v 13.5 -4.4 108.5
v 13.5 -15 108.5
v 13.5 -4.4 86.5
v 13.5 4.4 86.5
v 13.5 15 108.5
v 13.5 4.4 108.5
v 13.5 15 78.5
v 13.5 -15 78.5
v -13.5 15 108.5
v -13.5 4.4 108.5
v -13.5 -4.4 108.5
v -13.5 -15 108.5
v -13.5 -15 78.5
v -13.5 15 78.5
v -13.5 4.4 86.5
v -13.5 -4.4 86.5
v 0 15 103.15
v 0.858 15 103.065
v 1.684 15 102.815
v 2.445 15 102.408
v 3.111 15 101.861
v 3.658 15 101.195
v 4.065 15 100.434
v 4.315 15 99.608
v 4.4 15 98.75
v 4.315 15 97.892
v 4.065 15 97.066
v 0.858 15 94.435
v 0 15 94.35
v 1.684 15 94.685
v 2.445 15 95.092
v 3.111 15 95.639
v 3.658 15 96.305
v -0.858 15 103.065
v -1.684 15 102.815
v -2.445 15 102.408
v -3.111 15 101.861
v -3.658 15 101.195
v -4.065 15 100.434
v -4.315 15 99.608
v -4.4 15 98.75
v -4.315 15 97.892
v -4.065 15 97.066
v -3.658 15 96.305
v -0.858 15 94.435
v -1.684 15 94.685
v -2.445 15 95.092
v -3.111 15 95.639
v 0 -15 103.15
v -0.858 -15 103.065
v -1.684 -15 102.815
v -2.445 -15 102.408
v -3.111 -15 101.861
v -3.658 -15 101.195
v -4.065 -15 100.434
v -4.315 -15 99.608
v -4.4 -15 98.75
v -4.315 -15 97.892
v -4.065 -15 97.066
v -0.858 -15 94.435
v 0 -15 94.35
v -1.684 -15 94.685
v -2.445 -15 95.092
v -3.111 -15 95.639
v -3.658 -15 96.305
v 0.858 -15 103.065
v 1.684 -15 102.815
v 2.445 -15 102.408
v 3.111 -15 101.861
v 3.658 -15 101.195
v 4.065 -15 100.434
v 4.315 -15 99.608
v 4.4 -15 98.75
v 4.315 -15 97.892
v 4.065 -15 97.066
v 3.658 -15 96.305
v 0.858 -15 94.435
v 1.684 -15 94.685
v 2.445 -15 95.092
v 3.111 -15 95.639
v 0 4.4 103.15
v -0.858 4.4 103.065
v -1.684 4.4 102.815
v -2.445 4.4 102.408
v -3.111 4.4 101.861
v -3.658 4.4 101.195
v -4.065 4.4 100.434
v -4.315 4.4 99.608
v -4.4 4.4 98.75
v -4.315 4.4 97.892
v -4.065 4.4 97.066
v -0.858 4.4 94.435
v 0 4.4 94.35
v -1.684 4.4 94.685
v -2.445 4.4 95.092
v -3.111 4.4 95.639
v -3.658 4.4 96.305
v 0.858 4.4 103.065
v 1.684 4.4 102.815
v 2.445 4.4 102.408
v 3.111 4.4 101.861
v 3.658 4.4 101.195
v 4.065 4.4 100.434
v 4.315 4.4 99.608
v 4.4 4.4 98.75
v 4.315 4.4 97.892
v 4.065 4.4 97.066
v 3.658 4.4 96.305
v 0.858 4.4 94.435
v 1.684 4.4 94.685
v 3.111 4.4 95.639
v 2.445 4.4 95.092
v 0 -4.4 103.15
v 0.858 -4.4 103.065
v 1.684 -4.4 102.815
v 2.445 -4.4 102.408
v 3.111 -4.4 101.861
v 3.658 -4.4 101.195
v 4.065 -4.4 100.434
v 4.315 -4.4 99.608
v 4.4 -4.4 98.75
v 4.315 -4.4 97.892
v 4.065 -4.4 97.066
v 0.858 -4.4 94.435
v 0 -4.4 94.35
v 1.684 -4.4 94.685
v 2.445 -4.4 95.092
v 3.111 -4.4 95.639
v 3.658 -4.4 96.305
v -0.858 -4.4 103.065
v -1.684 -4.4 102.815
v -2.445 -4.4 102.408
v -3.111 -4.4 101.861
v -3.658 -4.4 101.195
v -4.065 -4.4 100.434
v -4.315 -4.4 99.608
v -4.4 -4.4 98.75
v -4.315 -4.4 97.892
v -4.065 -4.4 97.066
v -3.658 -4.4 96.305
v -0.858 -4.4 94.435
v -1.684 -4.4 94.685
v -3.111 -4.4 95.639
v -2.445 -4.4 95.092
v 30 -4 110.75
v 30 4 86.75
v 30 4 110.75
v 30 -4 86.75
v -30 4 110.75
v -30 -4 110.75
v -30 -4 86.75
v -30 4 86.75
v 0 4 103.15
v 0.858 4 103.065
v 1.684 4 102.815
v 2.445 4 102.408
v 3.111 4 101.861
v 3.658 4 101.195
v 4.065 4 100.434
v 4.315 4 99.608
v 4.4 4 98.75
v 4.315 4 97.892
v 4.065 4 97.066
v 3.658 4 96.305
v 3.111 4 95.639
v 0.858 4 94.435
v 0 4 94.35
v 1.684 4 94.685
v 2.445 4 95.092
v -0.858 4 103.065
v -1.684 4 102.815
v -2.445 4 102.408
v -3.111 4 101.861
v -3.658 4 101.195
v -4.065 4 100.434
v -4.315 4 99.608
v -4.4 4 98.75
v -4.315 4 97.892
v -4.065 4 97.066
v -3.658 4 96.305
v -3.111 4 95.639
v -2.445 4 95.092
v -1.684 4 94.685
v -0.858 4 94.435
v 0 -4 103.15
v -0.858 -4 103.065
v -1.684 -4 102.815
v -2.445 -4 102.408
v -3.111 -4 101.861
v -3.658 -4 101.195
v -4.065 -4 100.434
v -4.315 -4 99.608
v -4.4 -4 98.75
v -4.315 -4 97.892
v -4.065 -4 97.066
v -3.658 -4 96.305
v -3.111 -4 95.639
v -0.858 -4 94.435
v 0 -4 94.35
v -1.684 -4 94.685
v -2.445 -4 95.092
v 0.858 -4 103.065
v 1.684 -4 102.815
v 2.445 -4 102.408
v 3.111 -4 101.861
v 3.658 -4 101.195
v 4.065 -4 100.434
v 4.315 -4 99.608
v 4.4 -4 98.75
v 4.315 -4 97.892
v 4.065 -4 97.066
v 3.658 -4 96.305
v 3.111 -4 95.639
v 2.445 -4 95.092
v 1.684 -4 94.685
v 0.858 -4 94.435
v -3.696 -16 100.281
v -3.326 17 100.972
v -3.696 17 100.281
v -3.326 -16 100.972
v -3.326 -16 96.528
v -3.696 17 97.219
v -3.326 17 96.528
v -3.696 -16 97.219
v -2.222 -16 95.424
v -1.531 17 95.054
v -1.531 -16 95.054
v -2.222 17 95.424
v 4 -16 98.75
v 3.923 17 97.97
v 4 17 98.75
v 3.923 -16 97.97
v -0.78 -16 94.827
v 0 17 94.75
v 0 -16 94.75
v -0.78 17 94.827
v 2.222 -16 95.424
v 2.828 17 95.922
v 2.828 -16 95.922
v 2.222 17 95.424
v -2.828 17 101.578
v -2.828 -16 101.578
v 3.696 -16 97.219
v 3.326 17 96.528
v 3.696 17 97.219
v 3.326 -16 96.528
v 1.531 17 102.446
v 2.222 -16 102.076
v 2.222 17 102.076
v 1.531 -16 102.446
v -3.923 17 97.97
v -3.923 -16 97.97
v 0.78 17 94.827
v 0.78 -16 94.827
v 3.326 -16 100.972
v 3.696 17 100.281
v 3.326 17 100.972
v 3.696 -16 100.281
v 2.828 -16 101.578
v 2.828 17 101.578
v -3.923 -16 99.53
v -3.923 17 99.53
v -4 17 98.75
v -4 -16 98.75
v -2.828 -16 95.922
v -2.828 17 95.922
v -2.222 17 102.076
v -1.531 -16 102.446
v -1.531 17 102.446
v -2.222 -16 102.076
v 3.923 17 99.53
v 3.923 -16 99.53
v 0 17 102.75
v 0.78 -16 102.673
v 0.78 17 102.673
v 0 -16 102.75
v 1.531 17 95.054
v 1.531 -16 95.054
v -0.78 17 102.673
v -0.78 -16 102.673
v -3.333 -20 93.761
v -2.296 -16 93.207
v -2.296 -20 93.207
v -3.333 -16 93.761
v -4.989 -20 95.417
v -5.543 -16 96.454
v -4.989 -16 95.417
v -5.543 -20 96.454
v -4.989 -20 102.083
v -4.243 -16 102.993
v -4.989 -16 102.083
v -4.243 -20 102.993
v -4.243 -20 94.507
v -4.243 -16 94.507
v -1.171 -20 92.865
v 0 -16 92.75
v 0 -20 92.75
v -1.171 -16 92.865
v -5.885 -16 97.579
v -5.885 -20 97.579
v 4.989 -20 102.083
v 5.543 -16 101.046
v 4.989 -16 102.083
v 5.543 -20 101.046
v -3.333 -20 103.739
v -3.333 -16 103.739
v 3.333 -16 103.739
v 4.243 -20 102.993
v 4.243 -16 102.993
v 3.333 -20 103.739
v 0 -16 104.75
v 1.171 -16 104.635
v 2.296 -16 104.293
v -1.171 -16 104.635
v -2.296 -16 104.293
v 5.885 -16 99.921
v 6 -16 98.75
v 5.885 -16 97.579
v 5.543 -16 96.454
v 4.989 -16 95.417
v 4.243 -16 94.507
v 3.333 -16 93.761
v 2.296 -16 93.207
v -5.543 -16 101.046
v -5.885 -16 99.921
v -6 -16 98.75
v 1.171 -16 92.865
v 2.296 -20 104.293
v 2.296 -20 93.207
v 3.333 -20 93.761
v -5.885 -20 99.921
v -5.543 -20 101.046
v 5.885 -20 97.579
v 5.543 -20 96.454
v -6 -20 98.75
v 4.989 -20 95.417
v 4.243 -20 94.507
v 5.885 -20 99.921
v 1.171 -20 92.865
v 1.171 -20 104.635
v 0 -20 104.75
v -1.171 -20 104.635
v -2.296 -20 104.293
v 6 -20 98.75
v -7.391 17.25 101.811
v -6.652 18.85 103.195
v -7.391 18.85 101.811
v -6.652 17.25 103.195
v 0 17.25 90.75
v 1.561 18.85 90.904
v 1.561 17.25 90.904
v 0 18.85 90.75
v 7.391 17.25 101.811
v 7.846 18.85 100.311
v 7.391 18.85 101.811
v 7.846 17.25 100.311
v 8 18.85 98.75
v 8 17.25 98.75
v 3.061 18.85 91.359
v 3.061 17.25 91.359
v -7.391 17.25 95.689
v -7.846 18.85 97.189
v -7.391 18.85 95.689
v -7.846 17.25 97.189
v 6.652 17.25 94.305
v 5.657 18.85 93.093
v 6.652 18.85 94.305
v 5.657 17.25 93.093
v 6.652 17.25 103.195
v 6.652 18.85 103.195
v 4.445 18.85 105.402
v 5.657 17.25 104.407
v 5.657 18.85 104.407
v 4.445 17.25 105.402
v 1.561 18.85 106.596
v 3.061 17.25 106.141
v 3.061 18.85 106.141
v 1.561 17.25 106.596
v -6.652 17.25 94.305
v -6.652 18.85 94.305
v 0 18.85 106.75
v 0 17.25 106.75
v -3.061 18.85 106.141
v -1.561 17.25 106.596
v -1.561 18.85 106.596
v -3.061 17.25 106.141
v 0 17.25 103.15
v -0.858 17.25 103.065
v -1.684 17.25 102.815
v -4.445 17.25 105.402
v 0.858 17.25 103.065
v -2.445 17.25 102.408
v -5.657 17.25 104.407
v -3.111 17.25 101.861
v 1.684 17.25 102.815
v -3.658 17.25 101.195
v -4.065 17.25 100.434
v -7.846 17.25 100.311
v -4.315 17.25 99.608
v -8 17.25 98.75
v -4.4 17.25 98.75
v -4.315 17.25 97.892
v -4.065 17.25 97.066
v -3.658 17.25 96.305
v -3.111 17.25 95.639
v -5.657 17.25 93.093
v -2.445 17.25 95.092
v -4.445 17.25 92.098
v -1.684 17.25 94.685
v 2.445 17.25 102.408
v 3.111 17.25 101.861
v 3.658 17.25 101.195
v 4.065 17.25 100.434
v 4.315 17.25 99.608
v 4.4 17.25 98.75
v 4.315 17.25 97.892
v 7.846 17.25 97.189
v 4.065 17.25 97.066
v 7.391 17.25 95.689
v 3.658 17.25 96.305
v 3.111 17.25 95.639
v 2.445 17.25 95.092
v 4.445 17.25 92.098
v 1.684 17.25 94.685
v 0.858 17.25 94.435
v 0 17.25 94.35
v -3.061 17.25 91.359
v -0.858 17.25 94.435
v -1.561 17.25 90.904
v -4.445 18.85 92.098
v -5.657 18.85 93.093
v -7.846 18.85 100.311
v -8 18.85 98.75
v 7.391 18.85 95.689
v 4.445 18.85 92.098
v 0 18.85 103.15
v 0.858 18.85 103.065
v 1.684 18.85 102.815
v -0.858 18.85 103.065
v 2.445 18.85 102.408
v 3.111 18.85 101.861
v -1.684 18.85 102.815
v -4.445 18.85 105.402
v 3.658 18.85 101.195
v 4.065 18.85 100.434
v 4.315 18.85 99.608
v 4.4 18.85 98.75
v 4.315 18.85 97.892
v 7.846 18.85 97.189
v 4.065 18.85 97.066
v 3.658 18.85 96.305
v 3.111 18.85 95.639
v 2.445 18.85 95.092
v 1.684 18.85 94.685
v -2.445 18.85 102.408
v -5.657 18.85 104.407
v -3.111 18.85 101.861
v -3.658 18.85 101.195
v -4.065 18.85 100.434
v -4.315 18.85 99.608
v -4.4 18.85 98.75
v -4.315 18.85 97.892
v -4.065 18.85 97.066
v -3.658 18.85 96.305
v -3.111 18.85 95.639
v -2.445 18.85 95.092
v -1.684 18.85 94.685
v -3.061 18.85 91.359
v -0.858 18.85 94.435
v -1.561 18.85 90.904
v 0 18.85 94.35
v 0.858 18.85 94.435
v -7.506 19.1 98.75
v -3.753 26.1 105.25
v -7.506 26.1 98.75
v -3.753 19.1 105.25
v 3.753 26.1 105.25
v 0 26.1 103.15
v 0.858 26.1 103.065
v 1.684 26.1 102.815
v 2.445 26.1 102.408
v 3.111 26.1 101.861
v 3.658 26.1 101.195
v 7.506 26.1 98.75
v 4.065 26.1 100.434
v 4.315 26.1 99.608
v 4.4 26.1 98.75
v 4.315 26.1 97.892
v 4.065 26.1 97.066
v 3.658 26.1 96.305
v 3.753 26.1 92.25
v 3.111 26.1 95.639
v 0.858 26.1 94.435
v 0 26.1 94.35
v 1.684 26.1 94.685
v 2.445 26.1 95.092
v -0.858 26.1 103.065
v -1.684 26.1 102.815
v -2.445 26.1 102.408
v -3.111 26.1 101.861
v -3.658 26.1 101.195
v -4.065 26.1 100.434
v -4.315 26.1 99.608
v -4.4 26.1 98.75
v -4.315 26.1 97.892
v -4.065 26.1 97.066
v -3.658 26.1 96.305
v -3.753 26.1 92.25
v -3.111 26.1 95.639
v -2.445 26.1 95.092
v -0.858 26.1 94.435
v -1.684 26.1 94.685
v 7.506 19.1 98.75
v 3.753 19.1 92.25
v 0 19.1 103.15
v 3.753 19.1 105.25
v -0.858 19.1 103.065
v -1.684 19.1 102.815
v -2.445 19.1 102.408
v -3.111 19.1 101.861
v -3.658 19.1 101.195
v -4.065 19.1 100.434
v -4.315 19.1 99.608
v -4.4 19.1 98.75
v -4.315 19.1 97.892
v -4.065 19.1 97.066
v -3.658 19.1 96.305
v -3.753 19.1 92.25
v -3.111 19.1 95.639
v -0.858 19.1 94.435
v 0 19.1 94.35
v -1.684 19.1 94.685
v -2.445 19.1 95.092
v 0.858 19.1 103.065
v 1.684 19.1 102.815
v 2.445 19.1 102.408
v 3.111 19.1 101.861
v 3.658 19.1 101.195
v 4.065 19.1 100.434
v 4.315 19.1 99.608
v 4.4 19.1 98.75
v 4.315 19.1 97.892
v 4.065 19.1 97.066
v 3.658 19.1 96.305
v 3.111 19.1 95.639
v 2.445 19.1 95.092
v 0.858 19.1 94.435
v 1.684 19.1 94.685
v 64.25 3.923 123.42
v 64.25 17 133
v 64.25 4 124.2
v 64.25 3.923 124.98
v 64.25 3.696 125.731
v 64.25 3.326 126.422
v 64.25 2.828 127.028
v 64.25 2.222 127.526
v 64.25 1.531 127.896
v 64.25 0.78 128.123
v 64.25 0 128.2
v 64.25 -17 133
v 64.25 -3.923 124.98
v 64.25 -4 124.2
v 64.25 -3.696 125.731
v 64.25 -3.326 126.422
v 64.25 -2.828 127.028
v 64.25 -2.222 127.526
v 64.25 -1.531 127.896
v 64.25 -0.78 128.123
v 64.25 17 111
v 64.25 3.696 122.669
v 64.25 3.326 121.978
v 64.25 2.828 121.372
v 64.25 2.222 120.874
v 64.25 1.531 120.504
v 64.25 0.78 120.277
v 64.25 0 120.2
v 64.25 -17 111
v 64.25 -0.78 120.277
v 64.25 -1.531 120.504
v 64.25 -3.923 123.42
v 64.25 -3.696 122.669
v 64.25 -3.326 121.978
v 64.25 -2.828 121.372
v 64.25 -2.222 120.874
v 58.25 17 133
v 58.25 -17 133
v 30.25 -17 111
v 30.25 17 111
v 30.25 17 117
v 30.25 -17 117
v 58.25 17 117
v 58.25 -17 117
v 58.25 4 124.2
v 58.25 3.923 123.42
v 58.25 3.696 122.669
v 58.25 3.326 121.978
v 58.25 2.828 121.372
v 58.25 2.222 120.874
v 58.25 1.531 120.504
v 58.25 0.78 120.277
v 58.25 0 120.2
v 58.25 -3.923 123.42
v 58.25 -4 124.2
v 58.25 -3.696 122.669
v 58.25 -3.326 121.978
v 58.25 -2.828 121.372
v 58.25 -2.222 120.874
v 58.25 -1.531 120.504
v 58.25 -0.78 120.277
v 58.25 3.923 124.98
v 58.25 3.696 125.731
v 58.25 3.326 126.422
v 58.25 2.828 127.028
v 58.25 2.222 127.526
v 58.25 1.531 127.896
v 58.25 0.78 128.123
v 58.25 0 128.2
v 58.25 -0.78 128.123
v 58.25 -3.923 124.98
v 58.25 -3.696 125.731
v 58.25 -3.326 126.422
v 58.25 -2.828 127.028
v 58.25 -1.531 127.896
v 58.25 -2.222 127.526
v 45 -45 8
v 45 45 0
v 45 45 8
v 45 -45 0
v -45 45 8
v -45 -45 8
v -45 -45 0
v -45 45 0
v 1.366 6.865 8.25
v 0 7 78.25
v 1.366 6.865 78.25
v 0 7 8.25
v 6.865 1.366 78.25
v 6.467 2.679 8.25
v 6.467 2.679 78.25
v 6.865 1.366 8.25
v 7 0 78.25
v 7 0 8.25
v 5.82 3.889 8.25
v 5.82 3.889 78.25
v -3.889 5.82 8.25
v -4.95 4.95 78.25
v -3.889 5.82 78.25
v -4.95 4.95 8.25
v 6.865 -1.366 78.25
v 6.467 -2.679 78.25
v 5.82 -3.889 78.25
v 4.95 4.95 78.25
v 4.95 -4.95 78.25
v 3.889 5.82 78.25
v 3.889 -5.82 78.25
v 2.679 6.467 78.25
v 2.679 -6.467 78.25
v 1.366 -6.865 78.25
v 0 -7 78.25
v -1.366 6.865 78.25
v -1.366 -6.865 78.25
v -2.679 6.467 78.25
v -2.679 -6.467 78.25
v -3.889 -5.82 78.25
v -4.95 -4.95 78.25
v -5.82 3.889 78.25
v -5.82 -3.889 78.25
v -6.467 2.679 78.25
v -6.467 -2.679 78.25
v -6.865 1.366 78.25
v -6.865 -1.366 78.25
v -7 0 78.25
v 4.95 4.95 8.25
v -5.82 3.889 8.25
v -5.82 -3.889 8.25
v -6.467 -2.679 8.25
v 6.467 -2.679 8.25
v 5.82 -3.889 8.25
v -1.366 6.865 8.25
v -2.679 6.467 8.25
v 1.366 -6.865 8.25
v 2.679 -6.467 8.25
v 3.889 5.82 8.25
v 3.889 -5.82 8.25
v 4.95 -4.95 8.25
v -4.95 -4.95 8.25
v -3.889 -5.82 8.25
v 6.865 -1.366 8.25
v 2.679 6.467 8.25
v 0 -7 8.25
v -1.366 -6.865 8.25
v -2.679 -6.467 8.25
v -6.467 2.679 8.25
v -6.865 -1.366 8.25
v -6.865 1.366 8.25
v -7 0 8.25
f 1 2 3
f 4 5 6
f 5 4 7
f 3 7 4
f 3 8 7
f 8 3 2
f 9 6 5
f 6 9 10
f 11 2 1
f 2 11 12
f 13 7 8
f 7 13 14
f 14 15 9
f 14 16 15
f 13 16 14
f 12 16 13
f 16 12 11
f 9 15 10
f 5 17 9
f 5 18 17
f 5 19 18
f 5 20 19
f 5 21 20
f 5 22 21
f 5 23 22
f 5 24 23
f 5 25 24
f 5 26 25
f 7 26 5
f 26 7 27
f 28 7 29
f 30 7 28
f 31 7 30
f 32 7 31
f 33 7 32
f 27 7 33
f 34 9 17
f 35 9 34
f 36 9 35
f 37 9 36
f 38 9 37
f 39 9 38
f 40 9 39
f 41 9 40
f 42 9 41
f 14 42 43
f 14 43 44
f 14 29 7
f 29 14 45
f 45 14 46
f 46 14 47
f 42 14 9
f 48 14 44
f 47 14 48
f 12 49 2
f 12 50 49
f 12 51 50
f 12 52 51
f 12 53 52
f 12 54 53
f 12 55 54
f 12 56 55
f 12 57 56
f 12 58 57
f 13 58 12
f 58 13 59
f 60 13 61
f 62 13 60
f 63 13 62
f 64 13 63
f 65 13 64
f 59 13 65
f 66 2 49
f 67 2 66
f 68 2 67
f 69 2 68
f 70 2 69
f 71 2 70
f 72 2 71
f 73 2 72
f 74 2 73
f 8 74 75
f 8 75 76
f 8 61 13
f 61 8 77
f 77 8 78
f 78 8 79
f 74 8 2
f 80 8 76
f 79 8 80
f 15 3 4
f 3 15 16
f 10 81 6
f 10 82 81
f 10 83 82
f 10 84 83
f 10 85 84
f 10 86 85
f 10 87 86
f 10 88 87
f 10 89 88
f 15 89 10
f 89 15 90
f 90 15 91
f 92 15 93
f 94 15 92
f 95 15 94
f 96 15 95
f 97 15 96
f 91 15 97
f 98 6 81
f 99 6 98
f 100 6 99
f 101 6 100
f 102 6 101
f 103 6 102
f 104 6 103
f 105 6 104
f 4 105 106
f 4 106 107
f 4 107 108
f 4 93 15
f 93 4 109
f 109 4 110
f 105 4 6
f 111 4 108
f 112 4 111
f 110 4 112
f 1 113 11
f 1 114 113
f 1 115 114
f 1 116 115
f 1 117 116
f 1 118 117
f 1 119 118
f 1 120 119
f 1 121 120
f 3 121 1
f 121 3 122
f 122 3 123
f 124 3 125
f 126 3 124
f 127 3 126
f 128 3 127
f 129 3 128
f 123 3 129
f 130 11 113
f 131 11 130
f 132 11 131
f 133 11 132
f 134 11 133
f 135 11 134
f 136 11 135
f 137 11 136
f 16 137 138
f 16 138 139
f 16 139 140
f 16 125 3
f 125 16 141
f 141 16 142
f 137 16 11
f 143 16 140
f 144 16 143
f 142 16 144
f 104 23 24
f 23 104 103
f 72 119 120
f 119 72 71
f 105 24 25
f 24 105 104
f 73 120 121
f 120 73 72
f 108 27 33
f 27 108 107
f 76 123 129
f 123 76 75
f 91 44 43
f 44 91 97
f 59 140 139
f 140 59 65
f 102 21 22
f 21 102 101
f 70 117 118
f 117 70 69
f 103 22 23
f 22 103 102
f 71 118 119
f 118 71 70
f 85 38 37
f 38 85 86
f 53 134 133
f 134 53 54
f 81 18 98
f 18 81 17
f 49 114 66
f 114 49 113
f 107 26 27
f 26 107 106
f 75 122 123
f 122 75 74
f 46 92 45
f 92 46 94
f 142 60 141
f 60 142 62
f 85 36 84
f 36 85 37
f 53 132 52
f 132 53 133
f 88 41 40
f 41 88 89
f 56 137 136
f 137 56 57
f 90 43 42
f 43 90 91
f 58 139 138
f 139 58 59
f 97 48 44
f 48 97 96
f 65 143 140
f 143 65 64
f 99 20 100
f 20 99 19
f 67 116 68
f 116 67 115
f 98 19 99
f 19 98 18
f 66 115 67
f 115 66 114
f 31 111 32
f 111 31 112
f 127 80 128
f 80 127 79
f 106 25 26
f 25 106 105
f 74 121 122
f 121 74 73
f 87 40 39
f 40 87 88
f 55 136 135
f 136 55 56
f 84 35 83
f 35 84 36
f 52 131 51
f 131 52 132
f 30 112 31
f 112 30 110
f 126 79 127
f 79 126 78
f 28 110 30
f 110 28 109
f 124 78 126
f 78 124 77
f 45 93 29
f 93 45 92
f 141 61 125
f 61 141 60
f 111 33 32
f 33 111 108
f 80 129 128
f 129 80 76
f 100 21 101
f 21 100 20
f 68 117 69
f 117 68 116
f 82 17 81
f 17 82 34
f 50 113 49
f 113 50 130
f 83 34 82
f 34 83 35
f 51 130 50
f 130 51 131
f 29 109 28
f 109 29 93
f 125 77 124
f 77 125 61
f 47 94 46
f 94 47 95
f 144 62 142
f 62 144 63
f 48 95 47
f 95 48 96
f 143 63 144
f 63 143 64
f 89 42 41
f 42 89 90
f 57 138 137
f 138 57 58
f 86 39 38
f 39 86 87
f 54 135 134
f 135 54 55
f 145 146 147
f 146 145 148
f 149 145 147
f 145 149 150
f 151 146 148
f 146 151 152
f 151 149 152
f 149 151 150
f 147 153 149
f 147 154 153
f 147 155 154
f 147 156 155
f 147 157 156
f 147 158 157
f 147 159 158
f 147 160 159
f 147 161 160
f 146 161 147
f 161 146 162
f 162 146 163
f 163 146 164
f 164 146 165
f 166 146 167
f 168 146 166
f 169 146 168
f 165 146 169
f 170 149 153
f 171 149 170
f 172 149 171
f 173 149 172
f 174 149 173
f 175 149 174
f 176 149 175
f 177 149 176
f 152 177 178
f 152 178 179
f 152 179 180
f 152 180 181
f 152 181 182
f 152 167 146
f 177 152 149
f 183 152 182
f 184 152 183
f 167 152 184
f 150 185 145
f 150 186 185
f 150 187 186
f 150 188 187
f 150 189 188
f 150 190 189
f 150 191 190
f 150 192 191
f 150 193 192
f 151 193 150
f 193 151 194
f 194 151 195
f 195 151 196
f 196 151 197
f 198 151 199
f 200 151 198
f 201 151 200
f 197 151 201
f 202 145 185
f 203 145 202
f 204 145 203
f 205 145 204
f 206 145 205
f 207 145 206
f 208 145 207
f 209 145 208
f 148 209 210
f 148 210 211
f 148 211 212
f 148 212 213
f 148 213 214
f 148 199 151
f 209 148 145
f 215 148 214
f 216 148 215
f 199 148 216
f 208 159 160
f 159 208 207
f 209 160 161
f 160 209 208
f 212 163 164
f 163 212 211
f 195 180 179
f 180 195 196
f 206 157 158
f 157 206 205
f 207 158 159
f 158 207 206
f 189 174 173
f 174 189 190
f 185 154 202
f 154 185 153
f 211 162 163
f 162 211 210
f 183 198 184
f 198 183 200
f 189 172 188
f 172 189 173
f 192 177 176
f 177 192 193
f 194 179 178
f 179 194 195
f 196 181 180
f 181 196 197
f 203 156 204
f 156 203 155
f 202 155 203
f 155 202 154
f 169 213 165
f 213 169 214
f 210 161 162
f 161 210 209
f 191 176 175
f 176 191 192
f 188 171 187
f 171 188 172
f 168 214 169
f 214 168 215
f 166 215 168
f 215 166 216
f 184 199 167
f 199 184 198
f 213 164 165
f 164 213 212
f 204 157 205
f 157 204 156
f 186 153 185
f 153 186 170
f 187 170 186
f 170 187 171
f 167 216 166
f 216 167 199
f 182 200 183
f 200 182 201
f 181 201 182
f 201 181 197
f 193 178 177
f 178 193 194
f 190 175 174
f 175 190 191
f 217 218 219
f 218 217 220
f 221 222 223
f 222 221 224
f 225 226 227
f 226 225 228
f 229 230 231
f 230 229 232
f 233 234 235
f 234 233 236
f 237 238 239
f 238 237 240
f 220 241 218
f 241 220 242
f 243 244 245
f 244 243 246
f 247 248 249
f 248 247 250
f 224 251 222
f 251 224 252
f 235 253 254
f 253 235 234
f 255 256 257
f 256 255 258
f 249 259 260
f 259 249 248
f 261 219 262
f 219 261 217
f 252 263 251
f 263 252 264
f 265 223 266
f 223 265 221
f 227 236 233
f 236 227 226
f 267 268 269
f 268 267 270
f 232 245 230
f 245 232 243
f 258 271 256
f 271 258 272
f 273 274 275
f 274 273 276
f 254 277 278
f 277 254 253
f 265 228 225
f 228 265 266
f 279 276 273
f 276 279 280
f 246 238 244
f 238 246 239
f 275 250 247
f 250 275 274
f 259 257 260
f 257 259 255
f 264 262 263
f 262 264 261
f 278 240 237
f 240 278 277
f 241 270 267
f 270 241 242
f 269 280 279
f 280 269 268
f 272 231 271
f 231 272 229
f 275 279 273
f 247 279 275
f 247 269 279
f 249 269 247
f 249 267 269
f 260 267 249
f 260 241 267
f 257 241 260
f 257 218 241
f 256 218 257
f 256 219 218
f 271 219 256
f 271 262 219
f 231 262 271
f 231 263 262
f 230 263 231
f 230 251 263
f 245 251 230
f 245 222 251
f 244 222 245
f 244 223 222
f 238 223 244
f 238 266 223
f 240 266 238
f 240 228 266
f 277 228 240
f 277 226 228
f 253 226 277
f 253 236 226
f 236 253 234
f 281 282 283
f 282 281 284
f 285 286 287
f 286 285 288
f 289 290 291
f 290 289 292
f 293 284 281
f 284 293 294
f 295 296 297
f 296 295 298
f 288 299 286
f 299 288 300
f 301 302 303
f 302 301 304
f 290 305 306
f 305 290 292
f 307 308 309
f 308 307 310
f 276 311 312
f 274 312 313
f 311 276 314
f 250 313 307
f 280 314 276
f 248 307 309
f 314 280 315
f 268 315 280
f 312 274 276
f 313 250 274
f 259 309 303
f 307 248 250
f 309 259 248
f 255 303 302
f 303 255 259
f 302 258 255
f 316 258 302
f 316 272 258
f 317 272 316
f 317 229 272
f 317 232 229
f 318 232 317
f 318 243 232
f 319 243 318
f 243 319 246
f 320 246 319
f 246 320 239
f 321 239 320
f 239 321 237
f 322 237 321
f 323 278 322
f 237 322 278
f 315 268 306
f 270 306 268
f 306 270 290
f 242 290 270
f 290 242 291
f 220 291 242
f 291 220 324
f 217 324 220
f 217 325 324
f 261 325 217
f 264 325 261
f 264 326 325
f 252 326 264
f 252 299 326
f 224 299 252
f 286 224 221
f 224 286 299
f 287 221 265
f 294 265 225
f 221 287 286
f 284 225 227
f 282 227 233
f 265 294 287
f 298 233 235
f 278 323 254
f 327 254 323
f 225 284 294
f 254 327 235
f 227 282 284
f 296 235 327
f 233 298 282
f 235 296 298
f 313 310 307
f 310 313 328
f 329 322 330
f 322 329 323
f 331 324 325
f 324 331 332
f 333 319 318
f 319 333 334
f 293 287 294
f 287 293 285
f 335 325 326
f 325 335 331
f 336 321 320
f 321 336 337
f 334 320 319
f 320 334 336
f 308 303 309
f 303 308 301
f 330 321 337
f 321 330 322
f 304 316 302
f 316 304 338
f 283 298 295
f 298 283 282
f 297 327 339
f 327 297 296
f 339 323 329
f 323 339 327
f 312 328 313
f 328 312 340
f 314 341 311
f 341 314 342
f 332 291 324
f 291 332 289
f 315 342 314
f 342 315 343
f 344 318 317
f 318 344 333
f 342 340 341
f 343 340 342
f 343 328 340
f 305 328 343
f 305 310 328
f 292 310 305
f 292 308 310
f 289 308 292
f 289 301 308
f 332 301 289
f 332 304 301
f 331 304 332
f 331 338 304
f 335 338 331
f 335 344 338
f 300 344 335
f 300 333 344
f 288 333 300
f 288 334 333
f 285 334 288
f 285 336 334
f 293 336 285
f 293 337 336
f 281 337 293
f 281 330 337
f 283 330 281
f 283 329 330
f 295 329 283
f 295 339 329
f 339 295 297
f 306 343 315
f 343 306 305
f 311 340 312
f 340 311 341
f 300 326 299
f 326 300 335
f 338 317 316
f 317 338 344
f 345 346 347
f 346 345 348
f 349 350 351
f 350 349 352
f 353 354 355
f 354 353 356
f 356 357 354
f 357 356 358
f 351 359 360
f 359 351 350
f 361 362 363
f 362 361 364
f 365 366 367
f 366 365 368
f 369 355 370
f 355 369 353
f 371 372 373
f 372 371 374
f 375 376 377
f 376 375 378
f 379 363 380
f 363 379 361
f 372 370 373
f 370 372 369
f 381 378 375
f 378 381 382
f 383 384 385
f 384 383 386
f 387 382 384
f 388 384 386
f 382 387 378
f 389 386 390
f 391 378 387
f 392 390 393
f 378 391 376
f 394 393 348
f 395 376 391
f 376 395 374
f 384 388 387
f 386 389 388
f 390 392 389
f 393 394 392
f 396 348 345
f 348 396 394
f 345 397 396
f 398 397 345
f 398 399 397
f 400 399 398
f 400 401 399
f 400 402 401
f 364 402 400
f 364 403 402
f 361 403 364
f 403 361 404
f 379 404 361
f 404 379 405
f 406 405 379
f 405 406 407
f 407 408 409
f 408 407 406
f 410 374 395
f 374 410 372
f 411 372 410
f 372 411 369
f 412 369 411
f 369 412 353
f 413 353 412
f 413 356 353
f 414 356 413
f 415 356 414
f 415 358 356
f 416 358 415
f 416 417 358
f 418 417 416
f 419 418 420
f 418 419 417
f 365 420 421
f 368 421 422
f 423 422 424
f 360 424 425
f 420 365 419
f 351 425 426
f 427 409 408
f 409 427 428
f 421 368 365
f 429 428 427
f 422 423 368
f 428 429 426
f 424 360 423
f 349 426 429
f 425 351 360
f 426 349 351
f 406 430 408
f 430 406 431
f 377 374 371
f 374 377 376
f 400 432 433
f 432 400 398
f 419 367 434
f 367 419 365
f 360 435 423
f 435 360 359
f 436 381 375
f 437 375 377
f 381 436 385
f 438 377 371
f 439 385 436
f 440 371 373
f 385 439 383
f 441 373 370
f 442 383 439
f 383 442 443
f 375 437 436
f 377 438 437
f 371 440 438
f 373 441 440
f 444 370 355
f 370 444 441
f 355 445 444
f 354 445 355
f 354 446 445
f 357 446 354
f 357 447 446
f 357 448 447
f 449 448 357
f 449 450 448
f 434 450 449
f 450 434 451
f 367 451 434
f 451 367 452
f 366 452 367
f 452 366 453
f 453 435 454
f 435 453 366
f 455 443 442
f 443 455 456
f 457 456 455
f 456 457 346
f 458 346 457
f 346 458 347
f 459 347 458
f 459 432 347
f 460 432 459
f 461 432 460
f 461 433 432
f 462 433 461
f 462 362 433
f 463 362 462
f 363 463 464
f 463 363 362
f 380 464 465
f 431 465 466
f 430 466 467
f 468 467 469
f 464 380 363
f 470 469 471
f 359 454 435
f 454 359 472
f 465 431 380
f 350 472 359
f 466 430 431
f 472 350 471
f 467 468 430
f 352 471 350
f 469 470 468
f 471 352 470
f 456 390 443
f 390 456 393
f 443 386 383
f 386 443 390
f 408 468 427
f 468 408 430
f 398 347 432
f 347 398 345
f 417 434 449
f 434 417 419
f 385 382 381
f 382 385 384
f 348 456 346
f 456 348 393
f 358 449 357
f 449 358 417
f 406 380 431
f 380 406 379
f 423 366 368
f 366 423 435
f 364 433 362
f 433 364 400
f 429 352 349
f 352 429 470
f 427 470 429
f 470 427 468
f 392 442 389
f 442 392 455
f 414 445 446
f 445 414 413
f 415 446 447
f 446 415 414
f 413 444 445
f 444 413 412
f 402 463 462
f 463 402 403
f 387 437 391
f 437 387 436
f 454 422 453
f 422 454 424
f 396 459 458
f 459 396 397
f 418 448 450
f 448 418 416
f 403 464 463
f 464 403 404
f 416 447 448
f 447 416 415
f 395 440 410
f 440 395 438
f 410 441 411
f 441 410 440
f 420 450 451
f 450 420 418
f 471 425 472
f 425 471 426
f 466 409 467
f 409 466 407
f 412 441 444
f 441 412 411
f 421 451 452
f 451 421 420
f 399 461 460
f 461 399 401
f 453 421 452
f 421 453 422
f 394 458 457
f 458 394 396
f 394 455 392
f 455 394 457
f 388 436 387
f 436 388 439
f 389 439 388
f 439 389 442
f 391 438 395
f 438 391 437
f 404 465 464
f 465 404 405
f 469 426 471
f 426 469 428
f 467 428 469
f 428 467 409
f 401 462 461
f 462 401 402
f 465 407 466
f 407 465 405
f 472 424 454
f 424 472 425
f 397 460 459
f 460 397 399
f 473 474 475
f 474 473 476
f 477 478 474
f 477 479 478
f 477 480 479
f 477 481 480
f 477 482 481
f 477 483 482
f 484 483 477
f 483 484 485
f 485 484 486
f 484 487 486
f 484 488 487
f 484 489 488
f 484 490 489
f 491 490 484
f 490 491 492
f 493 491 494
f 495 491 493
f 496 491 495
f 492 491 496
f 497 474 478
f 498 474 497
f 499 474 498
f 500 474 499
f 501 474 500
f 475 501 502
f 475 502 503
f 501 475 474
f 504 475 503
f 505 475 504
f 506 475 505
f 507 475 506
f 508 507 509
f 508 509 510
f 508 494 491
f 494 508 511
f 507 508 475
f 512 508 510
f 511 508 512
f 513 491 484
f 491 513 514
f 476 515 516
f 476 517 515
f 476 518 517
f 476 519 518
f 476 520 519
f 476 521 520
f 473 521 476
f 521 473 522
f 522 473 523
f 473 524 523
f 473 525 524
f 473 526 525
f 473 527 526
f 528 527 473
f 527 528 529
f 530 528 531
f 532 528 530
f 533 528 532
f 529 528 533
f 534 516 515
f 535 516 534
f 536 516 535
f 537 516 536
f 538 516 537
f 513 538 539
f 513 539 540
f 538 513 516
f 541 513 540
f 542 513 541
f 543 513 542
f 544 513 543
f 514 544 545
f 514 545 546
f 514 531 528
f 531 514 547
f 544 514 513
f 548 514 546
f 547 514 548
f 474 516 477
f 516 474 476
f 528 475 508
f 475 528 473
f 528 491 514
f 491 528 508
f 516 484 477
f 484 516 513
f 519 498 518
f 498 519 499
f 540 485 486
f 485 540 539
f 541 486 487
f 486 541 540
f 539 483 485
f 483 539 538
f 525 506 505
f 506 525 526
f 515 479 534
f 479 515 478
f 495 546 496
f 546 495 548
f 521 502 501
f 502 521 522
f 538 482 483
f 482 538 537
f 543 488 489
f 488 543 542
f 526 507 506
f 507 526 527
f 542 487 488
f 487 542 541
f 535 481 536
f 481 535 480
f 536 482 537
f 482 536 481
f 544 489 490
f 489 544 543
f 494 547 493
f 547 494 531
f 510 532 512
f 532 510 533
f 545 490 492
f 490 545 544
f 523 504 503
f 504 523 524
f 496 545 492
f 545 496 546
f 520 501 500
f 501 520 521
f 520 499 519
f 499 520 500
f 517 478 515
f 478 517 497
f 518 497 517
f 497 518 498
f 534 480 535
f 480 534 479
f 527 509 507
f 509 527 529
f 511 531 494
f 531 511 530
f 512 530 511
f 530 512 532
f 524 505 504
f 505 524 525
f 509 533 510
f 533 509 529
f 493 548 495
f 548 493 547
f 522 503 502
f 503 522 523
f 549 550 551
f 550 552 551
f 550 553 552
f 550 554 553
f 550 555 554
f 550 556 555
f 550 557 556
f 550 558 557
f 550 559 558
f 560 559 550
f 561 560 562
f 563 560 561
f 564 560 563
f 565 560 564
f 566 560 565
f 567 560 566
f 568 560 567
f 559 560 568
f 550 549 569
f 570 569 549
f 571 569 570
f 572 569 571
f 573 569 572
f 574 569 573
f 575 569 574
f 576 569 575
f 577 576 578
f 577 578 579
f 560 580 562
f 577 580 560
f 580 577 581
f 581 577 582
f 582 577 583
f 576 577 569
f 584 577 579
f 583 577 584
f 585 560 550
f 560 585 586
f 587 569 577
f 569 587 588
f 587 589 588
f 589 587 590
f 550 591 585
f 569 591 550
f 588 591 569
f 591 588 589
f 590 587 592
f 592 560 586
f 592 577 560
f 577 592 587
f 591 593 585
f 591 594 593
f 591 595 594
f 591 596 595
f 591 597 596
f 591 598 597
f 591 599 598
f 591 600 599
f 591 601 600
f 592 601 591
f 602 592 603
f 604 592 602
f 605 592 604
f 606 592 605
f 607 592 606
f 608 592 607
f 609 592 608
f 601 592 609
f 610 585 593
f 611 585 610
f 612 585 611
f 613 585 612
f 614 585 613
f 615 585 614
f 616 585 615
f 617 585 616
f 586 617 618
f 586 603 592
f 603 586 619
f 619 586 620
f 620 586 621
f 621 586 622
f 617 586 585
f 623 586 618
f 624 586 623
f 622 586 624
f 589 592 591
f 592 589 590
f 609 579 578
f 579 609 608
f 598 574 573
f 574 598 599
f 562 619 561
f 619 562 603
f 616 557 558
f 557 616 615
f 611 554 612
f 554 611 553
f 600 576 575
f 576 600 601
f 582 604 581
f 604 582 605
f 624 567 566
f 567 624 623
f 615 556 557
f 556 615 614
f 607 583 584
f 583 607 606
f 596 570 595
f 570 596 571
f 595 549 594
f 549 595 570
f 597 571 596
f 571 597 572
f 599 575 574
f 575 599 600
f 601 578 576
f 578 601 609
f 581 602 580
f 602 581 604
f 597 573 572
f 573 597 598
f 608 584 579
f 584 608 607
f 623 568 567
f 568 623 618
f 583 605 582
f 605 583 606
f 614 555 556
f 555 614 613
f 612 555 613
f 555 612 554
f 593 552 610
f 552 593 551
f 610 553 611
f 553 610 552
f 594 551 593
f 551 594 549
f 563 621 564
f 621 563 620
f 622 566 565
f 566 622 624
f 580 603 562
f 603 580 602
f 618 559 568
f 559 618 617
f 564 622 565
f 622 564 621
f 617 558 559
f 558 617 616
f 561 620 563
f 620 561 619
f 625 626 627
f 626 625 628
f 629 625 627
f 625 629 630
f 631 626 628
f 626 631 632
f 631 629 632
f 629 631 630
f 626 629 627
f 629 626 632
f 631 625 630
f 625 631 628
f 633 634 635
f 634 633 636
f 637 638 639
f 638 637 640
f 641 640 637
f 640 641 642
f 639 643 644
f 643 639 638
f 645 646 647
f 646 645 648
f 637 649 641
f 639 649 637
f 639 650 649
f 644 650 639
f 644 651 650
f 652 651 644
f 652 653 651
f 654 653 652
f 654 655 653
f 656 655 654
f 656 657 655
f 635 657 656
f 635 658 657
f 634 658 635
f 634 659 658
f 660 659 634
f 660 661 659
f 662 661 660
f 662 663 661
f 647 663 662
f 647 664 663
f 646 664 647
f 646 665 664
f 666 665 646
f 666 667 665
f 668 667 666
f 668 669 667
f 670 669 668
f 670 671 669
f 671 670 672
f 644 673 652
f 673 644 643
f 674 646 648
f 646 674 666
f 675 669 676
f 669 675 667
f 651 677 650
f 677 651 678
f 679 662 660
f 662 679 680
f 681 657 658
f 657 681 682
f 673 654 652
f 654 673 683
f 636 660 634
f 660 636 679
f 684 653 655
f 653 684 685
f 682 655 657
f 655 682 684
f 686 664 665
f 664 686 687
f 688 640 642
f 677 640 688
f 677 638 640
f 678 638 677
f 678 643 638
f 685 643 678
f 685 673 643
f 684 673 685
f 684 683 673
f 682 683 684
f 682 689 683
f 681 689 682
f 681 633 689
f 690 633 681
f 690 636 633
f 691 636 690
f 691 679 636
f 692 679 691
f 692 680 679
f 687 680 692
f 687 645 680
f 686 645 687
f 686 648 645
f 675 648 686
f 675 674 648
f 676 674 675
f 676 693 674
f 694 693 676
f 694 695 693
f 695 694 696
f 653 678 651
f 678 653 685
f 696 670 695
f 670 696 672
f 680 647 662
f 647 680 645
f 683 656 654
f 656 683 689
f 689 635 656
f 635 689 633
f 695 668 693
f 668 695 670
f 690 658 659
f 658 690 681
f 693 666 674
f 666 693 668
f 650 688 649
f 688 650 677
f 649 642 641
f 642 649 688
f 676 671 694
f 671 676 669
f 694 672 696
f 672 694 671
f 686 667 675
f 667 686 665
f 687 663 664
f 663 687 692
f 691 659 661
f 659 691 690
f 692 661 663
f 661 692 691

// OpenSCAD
$fn = 32;

// ------------------------------------------------------------------------
// Lamp arm: column d14 x 70 mm, arm 60 mm
// Every part is its own module, assembly() places every instance.
// ------------------------------------------------------------------------

// --- part 1 ---
module lamp_base() {
  difference() {
    translate([-45, -45, 0]) cube([90, 90, 8]);
  }
}

// --- part 2 ---
module lamp_column() {
  cylinder(h = 70, d = 14);
}

// --- part 3 ---
module head_fork() {
  difference() {
    translate([-13.5, -15, 0]) cube([27, 30, 30]);
    translate([-14.5, -4.4, 8]) cube([29, 8.8, 23]);
    translate([0, 0, 20.25]) rotate([90, 0, 0]) cylinder(h = 32, d = 8.8, center = true);
  }
}

// --- part 4 ---
module lamp_arm() {
  difference() {
    translate([-30, -4, 0]) cube([60, 8, 24]);
    translate([0, 0, 12]) rotate([90, 0, 0]) cylinder(h = 10, d = 8.8, center = true);
  }
}

// --- part 5 ---
module arm_pin() {
  rotate([0, 90, 0]) cylinder(h = 34, d = 8, center = true);
  translate([-20, 0, 0]) rotate([0, 90, 0]) cylinder(h = 4, d = 12);
}

// --- part 6 ---
module arm_washer() {
  difference() {
      translate([0, 0, 0]) cylinder(h = 1.6, d = 16);
      translate([0, 0, -1]) cylinder(h = 3.6, d = 8.8);
    }
}

// --- part 7 ---
module arm_nut() {
  difference() {
    linear_extrude(height = 7) polygon(points = [[7.506, 0], [3.753, 6.5], [-3.753, 6.5], [-7.506, 0], [-3.753, -6.5], [3.753, -6.5]]);
    translate([0, 0, -1]) cylinder(h = 9, d = 8.8);
  }
}

// --- part 8 ---
module shade_bracket() {
  difference() {
    translate([-17, -17, 0]) cube([34, 34, 22]);
    translate([-18, -18, 6]) cube([29, 36, 17]);
    translate([14, 0, 13.2]) rotate([0, 90, 0]) cylinder(h = 8, d = 8, center = true);
  }
}

// --- assembly ---
module assembly() {
  color([0.80, 0.24, 0.20]) translate([0, 0, 0]) rotate([0, 0, 0]) lamp_base();
  color([0.20, 0.45, 0.75]) translate([0, 0, 8.25]) rotate([0, 0, 0]) lamp_column();
  color([0.25, 0.62, 0.32]) translate([0, 0, 78.5]) rotate([0, 0, 0]) head_fork();
  color([0.92, 0.70, 0.18]) translate([0, 0, 86.75]) rotate([0, 0, 0]) lamp_arm();
  color([0.58, 0.35, 0.70]) translate([0, 0, 98.75]) rotate([0, 0, 90]) arm_pin();
  color([0.16, 0.66, 0.66]) translate([0, 18.85, 98.75]) rotate([90, 0, 0]) arm_washer();
  color([0.85, 0.48, 0.18]) translate([0, 26.1, 98.75]) rotate([90, 0, 0]) arm_nut();
  color([0.55, 0.60, 0.65]) translate([47.25, 0, 111]) rotate([0, 0, 0]) shade_bracket();
}

assembly();
